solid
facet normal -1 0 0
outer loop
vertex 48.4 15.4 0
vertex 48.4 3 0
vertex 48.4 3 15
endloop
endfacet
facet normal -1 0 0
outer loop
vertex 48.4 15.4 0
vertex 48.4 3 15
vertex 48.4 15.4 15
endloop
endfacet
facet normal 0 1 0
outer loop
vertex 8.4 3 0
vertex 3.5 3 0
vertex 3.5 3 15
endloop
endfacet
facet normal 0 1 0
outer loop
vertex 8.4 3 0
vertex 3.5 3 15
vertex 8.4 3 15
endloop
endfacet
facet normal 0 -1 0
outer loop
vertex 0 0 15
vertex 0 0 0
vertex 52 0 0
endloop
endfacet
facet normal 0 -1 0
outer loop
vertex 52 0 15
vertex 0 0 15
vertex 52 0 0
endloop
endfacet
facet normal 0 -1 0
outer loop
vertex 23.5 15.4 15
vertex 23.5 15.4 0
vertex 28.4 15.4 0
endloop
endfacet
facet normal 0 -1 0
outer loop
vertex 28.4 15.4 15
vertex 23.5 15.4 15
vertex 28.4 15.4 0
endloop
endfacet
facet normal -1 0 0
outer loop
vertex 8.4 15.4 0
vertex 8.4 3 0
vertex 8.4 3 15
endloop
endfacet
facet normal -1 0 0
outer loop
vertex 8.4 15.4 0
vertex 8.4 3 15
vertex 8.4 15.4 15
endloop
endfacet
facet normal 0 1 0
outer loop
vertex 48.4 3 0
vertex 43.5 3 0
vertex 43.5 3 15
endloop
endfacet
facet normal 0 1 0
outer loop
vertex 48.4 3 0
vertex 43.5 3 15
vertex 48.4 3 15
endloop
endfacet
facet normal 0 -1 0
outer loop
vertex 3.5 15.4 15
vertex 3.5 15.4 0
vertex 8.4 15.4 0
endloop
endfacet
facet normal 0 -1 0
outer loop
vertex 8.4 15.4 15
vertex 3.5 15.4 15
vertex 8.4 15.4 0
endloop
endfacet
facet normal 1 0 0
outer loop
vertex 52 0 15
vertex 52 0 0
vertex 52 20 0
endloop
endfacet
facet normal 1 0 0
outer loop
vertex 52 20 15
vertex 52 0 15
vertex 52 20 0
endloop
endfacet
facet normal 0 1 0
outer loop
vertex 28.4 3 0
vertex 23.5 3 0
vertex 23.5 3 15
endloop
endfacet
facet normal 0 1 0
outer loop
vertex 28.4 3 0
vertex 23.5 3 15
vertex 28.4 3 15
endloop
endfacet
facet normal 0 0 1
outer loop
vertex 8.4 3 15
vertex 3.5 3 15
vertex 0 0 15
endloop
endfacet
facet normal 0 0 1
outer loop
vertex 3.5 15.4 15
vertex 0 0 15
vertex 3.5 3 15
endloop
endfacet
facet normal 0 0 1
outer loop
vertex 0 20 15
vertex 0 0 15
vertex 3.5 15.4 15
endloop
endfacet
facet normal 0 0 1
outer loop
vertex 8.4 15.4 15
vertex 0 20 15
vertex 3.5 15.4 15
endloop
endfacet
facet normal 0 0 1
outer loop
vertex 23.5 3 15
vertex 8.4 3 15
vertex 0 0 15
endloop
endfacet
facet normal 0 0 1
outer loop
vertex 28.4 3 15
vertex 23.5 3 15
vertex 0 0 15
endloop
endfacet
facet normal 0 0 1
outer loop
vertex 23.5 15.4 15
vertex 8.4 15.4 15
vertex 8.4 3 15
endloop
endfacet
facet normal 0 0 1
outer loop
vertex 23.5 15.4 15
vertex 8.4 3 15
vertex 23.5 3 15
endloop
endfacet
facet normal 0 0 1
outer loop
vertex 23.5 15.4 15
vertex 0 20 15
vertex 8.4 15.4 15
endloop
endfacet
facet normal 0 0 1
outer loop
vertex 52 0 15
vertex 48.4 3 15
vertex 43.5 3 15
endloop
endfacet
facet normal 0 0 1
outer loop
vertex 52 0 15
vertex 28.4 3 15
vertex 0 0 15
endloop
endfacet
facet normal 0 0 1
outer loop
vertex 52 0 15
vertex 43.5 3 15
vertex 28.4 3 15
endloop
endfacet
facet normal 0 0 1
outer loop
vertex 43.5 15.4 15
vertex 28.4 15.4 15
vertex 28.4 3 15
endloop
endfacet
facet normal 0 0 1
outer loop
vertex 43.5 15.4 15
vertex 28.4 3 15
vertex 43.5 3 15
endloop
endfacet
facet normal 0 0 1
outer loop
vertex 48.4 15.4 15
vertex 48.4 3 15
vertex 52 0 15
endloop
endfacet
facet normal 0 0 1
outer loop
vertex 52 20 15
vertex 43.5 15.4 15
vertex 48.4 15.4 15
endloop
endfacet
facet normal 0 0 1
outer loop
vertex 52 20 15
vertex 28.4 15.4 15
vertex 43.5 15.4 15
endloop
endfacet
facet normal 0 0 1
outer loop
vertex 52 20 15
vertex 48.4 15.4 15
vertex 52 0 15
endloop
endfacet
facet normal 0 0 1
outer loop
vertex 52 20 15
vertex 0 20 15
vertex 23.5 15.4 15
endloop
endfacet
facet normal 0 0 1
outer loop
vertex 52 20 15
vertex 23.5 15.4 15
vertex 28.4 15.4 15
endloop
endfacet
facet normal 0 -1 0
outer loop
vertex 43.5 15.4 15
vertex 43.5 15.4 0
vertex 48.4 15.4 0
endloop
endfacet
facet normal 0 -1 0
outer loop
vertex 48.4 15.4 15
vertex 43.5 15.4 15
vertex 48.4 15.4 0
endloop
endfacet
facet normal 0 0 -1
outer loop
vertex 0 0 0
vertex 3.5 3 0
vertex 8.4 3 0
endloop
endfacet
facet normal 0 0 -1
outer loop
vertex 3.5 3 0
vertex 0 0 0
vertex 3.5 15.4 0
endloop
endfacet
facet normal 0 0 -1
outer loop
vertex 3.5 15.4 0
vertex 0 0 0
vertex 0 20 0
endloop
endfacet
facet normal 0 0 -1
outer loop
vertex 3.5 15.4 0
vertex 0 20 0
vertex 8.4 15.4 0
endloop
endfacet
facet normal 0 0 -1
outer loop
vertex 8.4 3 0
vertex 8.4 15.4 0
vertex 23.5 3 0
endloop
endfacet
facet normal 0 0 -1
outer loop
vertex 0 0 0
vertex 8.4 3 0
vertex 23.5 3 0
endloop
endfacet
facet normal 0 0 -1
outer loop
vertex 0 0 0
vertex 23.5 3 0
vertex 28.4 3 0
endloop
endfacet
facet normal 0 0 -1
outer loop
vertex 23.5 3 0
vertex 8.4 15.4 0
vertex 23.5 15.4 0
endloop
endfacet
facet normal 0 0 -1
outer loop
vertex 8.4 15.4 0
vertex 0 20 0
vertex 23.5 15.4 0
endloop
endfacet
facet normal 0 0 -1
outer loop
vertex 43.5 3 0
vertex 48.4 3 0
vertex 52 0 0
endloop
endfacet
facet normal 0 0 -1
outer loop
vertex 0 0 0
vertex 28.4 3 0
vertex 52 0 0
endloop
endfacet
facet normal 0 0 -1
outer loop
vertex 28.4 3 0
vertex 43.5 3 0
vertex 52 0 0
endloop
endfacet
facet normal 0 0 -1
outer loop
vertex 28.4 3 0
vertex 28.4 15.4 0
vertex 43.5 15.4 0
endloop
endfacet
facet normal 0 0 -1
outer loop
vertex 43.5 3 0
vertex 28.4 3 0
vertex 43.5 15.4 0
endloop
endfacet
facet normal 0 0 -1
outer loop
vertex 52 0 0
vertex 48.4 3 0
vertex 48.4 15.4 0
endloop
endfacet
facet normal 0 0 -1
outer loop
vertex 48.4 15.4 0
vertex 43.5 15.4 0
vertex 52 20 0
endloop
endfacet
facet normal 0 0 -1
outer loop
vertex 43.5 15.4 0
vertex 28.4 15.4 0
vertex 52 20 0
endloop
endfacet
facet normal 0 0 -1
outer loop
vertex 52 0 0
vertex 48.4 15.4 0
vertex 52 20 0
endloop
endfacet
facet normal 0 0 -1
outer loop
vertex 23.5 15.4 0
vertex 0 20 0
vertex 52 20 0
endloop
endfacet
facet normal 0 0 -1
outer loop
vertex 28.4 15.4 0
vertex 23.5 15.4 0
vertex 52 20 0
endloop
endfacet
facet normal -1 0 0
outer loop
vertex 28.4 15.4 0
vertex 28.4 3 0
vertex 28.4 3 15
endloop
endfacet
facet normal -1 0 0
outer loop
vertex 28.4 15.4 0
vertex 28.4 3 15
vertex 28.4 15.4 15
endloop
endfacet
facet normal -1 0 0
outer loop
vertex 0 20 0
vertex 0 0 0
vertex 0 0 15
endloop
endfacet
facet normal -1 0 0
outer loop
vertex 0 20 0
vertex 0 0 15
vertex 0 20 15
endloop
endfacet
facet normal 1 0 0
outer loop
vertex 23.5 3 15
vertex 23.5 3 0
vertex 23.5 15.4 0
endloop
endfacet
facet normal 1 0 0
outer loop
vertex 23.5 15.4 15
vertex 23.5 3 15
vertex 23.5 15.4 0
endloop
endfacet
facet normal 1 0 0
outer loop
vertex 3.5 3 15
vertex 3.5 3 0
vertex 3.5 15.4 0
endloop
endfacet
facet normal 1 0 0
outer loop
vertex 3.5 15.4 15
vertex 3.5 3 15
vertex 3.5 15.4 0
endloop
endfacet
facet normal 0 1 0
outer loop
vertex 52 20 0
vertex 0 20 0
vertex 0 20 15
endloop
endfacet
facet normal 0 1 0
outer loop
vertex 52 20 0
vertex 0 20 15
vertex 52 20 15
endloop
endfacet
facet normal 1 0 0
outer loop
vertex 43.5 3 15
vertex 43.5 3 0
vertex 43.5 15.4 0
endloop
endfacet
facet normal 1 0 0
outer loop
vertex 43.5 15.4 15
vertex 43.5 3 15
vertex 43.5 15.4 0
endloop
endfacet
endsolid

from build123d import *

# Parameters (mm, degrees)
BOX002_W     = 4.9
BOX002_H     = 12.4
BOX002_DEPTH = 16
BOX003_W     = 4.9
BOX003_H     = 12.4
BOX003_DEPTH = 16
BOX001_W     = 4.9
BOX001_H     = 12.4
BOX001_DEPTH = 16
BOX_W        = 52
BOX_H        = 20
BOX_DEPTH    = 15


with BuildPart() as cubo002:
    # Box002 → Box002 (new body)
    with BuildSketch(Plane(origin=(43.5, 3, 0), x_dir=(1, 0, 0), z_dir=(0, 0, 1))):
        with Locations((2.45, 6.2)):
            Rectangle(BOX002_W, BOX002_H)
    extrude(amount=BOX002_DEPTH)


with BuildPart() as cubo003:
    # Box003 → Box003 (new body)
    with BuildSketch(Plane(origin=(23.5, 3, 0), x_dir=(1, 0, 0), z_dir=(0, 0, 1))):
        with Locations((2.45, 6.2)):
            Rectangle(BOX003_W, BOX003_H)
    extrude(amount=BOX003_DEPTH)


with BuildPart() as cubo001:
    # Box001 → Box001 (new body)
    with BuildSketch(Plane(origin=(3.5, 3, 0), x_dir=(1, 0, 0), z_dir=(0, 0, 1))):
        with Locations((2.45, 6.2)):
            Rectangle(BOX001_W, BOX001_H)
    extrude(amount=BOX001_DEPTH)


with BuildPart() as cut002:
    # Box → Box (new body)
    with BuildSketch(Plane.XY):
        with Locations((26, 10)):
            Rectangle(BOX_W, BOX_H)
    extrude(amount=BOX_DEPTH)

    # Cut: cut Cubo001
    add(cubo001.part, mode=Mode.SUBTRACT)

    # Cut001: cut Cubo003
    add(cubo003.part, mode=Mode.SUBTRACT)

    # Cut002: cut Cubo002
    add(cubo002.part, mode=Mode.SUBTRACT)


solid = cut002.part
